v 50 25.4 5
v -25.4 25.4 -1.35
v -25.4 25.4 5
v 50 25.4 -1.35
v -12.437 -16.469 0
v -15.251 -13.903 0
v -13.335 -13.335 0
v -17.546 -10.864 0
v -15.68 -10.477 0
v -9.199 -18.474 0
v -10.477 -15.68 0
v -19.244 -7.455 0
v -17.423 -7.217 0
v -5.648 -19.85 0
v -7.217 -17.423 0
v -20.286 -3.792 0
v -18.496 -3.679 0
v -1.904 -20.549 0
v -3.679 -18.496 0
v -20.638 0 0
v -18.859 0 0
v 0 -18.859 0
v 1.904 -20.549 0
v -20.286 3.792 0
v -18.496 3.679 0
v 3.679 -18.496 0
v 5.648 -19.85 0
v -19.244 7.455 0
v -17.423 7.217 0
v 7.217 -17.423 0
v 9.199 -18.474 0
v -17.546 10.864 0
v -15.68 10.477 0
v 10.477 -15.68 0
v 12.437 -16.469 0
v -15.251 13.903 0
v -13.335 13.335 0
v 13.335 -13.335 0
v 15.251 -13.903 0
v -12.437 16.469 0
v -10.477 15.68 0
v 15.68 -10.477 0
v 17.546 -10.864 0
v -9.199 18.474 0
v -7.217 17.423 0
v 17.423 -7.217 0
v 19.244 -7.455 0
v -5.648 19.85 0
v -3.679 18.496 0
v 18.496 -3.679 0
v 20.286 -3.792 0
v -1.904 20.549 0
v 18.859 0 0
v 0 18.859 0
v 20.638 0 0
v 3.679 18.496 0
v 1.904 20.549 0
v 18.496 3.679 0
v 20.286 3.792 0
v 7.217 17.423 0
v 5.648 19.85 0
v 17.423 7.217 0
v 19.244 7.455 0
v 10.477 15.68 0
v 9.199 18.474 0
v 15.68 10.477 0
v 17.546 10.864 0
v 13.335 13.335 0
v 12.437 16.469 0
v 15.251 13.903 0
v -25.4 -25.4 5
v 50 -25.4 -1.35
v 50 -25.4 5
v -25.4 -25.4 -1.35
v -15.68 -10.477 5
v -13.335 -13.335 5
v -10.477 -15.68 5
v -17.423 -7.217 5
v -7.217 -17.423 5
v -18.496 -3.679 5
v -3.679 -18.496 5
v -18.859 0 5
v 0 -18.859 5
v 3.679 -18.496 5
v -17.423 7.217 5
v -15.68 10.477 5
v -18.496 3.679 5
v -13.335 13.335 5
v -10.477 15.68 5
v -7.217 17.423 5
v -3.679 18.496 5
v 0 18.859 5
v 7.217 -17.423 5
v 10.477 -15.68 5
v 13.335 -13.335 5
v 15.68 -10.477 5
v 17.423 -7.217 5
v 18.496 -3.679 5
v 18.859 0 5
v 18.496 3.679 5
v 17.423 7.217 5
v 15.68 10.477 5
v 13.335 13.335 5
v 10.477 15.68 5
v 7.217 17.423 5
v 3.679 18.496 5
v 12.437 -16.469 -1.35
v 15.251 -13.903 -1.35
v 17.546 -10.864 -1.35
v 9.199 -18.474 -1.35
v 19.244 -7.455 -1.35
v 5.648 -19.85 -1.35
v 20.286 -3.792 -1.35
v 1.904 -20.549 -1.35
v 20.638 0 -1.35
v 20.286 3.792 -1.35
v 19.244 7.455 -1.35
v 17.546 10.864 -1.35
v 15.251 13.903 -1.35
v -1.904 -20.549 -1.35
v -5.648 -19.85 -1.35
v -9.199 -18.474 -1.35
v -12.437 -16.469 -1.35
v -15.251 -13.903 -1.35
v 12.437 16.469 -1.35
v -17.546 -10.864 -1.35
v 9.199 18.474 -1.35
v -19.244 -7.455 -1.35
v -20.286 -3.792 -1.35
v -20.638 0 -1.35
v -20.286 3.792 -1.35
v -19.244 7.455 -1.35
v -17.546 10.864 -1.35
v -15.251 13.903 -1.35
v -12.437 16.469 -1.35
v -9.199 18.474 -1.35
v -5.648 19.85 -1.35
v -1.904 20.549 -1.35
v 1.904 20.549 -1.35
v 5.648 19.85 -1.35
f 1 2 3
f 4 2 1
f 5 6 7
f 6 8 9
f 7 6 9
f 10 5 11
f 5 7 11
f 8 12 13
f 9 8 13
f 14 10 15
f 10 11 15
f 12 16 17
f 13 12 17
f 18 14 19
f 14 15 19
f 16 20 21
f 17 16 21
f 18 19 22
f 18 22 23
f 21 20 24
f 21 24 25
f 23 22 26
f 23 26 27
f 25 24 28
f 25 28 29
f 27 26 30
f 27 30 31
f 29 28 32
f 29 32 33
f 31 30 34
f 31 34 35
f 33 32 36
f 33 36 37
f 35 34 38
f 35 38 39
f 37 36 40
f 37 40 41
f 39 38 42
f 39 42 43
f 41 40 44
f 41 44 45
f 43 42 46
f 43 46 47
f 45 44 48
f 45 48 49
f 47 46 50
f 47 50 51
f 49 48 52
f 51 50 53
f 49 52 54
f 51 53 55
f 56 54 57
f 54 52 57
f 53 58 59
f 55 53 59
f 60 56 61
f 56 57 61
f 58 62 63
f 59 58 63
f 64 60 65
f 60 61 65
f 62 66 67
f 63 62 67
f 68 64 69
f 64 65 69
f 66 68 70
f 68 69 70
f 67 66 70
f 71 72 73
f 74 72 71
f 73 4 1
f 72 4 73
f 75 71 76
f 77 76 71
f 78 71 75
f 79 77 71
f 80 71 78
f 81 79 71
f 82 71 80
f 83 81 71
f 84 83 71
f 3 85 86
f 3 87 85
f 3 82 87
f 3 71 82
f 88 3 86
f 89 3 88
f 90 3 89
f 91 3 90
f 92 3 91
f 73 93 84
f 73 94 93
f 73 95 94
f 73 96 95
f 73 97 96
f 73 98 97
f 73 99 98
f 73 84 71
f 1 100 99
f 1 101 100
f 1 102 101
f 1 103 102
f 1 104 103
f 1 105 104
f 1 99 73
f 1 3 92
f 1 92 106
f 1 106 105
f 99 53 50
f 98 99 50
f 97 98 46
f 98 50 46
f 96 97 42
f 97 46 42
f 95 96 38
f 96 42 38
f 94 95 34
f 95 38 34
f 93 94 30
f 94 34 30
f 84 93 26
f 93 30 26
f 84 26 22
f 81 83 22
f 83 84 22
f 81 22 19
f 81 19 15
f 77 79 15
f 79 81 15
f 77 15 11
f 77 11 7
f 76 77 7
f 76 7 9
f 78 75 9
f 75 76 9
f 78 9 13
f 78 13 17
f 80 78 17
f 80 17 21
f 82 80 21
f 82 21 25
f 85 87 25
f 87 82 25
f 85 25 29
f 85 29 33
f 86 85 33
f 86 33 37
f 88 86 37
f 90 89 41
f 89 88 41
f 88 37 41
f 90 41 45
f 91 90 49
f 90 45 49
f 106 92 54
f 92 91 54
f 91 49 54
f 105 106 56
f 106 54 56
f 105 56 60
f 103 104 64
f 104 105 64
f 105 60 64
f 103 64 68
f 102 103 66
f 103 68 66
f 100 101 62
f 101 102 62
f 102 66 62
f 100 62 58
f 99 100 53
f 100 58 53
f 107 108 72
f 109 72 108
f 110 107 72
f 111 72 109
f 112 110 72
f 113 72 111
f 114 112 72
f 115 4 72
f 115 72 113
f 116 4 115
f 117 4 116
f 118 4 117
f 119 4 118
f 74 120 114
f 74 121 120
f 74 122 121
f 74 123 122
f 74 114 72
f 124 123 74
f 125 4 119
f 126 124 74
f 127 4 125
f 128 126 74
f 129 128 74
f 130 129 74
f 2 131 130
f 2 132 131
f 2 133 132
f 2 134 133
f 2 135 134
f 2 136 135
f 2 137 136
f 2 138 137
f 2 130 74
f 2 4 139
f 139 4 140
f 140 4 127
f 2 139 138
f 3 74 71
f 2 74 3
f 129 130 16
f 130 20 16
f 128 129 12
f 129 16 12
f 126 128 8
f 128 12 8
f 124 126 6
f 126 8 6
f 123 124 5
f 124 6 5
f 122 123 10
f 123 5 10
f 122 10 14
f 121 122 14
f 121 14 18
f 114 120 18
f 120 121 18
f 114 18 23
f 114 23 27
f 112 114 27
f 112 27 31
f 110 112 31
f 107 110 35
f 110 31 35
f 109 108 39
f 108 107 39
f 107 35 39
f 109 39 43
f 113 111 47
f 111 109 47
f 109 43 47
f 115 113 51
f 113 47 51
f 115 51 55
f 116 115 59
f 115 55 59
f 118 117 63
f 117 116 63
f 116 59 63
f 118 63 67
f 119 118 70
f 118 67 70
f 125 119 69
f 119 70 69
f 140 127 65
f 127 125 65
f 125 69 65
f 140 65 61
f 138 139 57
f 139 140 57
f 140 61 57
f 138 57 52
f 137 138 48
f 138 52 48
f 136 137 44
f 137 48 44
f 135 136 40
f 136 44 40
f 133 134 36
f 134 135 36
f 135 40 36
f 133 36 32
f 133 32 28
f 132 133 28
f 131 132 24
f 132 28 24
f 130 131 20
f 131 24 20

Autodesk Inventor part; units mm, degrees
ref_plane "YZ Plane" through (0, 0, 0) normal (1, 0, 0) x (0, 1, 0)
ref_plane "XZ Plane" through (0, 0, 0) normal (0, 1, 0) x (-1, 0, 0)
ref_plane "XY Plane" through (0, 0, 0) normal (0, 0, 1) x (1, 0, 0)
sketch "Sketch2" plane through (0, 0, 0) normal (0, 0, 1) x (1, 0, 0)
  circle A0 centre (0, 0) radius 18.8587
  circle A1 centre (0, 0) radius 20.6375
  dimension "d0" = 37.7174
  dimension "d1" = 41.275
extrude "Extrusion1" add sketch "Sketch2" along normal blind 5
sketch "Sketch3" plane through (0, 0, 0) normal (0, 0, -1) x (-1, 0, 0)
  circle A0 centre (0, 0) radius 20.6375
  circle A1 centre (0, 0) radius 23.1375
  dimension "d4" = 46.275
extrude "Extrusion2" add sketch "Sketch3" along normal blind 1.35 and the other way blind 5
sketch "Sketch10" plane through (0, 0, -1.35) normal (0, 0, -1) x (-1, 0, 0)
  line L0 (-25.4, -25.4) -> (25.4, -25.4)
  line L1 (25.4, -25.4) -> (25.4, 25.4)
  line L2 (25.4, 25.4) -> (-25.4, 25.4)
  line L3 (-25.4, 25.4) -> (-25.4, 0)
  line L4 (-25.4, -25.4) -> (25.4, 25.4) construction
  line L5 (25.4, -25.4) -> (-25.4, 25.4) construction
  line L6 (-25.4, 25.4) -> (-56.5021, 25.4)
  line L7 (-50, -25.4) -> (-25.4, -25.4)
  line L8 (-25.4, 0) -> (-25.4, 25.4)
  line L9 (0, 0) -> (-50, 0)
  line L10 (-50, 0) -> (-50, 25.4)
  line L11 (-50, 0) -> (-50, -25.4)
  circle A0 centre (0, 0) radius 23.1375
  dimension "d46" = 50.8
  dimension "d47" = 50.8
  dimension "d48" = 50
extrude "Extrusion9" add sketch "Sketch10" against normal blind 6.35
properties part number "3102_Biax_Coil_Mounting_Bracket_MPSv2_v1" material "Aluminum 6061"
